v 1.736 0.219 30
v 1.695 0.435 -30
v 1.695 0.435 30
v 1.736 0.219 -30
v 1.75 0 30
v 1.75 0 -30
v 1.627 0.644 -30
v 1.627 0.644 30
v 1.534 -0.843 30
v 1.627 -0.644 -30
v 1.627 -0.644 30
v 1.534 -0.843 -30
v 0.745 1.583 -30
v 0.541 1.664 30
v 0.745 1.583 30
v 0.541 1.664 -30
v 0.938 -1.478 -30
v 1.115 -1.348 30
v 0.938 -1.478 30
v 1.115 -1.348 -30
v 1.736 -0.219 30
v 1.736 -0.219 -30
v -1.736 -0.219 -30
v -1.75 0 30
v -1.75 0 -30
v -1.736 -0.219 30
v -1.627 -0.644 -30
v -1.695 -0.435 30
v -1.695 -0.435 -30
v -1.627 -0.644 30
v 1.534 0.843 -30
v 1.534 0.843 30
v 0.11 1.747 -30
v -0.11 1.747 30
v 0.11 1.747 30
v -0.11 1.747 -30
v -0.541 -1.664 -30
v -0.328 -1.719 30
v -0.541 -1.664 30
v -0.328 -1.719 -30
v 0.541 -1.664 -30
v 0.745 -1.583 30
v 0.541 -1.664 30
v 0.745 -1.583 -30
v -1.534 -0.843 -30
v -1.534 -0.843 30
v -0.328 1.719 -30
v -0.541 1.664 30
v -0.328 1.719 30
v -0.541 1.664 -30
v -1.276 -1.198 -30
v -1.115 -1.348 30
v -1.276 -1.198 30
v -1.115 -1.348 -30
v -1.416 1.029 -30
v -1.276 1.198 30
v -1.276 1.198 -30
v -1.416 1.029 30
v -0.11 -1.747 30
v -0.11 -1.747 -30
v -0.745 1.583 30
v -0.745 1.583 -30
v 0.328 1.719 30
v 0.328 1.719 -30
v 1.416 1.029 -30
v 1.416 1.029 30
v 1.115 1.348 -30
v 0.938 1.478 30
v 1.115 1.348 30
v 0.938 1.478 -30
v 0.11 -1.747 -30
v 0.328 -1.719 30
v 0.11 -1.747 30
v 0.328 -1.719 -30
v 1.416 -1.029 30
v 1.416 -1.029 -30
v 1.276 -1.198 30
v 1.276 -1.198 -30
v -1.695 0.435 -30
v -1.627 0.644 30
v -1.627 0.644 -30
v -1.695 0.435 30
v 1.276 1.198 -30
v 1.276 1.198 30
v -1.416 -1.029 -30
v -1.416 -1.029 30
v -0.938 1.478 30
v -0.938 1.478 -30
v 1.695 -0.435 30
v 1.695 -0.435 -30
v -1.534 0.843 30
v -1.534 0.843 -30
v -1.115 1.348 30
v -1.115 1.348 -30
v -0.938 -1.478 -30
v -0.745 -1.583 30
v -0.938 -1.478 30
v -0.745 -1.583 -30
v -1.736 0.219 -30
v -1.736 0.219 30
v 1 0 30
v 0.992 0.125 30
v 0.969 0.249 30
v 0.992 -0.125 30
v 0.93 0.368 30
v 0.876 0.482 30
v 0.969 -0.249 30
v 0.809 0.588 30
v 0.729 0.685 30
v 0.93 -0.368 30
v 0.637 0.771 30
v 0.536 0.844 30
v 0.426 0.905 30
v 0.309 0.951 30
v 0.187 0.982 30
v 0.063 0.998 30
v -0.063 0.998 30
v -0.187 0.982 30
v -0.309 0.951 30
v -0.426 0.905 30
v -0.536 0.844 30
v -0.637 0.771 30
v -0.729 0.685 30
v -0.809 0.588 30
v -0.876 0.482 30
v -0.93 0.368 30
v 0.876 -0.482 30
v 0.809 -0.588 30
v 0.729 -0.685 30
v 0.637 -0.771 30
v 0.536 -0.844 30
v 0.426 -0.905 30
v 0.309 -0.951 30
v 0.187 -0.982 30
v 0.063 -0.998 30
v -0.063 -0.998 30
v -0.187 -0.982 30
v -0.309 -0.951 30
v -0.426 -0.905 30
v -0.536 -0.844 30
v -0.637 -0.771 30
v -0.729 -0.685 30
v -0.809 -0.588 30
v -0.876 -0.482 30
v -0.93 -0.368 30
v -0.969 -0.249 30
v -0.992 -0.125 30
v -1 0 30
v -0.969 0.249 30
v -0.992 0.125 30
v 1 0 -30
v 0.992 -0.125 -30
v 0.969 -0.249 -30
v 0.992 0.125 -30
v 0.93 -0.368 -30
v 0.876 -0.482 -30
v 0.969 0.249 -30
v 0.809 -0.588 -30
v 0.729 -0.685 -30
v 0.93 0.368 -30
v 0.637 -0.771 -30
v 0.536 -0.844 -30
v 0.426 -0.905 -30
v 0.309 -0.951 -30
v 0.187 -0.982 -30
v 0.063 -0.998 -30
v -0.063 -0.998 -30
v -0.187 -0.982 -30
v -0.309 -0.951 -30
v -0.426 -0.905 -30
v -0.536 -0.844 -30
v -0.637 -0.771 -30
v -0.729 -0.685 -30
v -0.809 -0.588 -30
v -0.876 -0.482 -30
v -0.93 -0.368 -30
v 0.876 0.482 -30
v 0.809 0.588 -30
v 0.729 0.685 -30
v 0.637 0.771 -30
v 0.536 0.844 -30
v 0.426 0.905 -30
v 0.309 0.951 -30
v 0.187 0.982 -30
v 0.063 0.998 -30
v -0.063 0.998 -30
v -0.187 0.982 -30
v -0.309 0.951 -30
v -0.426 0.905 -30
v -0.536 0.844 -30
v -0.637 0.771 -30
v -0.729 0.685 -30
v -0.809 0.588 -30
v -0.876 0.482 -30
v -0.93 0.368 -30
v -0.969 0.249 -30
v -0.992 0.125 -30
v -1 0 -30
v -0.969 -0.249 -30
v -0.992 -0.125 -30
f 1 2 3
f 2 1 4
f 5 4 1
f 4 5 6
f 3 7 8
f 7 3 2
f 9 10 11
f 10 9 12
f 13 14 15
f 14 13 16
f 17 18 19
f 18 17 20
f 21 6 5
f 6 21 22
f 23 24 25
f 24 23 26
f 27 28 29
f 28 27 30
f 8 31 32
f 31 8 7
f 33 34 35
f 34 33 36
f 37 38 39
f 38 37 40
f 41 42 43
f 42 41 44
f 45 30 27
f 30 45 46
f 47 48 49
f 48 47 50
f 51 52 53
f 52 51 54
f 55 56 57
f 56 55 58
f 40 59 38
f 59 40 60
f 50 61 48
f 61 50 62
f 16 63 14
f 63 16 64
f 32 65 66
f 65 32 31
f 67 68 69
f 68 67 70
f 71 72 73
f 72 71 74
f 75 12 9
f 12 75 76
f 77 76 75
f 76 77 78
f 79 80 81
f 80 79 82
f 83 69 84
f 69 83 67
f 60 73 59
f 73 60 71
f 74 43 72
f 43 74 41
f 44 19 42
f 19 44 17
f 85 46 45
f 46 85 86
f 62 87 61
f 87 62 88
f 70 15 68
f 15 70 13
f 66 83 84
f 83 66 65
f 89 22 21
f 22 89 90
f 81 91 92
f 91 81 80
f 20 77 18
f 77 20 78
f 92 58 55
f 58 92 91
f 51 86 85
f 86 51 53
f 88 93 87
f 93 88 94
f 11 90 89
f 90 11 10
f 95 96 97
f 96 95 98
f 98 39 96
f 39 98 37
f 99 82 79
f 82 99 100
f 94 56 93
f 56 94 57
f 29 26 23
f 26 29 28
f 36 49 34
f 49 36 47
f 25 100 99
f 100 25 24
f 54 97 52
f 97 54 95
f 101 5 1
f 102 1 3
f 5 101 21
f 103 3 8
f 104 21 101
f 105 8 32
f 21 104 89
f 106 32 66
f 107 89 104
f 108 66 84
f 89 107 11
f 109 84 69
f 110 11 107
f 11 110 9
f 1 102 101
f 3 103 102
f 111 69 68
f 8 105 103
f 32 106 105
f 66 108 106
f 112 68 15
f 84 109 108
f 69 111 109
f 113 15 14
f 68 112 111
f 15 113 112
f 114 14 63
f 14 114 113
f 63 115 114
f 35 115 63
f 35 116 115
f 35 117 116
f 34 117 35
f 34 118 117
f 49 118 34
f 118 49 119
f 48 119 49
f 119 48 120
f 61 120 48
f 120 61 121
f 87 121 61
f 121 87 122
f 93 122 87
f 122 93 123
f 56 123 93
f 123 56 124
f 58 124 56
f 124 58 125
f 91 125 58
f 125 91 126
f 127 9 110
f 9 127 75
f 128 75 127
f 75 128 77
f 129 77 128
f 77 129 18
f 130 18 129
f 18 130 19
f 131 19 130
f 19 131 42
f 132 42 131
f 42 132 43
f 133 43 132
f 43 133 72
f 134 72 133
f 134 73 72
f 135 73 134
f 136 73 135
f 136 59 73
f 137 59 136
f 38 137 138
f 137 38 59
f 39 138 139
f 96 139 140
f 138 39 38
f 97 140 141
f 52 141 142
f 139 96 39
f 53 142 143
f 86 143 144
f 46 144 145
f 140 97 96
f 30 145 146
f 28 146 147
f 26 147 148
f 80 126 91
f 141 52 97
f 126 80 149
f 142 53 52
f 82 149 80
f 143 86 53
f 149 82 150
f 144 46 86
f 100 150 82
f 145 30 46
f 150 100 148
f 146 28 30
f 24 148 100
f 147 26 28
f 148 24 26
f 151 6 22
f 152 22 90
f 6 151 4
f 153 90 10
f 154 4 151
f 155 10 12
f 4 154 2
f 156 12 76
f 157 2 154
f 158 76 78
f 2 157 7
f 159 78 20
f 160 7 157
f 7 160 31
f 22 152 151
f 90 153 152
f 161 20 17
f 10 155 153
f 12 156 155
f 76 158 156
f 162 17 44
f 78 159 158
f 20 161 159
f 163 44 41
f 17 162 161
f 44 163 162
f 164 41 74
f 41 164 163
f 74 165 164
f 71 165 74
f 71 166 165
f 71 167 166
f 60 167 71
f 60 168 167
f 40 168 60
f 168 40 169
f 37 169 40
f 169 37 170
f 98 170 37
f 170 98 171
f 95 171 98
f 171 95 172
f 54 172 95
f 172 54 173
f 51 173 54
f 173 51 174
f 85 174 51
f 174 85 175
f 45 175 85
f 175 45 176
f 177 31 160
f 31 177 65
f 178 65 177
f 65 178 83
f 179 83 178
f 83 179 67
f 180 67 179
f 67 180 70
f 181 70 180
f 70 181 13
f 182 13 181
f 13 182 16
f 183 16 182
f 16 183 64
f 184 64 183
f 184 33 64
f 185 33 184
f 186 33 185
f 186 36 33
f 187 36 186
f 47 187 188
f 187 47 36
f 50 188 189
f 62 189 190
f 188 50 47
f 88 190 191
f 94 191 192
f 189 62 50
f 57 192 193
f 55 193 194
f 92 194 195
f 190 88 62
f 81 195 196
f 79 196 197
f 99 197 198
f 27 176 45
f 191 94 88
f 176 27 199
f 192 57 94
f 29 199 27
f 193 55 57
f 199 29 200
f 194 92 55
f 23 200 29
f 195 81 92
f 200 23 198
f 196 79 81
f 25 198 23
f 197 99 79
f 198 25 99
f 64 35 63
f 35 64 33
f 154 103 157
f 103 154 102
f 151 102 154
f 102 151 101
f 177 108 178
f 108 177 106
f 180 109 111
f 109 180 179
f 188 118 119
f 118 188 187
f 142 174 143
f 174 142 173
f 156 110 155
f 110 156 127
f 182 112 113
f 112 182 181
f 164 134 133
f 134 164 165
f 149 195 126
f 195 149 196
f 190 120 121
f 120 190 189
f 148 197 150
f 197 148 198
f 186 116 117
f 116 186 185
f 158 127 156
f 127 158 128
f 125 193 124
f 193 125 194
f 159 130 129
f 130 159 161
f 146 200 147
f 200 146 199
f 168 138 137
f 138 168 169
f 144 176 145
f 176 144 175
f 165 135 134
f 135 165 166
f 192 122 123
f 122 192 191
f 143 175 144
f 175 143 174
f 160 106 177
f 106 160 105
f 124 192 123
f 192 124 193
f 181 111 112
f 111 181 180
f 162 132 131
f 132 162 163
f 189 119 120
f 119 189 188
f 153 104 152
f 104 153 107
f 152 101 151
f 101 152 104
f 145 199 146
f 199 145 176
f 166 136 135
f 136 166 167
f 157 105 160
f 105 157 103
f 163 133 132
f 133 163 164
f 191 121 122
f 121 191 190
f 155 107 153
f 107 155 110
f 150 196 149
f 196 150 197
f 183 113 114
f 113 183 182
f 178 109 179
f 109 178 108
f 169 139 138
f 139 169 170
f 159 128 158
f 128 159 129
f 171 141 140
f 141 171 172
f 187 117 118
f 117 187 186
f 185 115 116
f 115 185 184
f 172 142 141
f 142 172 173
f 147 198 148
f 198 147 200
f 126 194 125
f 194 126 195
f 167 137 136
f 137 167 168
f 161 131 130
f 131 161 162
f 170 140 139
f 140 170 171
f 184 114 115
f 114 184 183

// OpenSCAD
$fn = 50;


difference() {
	union() {
		translate(v = [0, 0, -30.0000000000]) {
			cylinder(h = 60, r = 1.7500000000);
		}
	}
	union() {
		translate(v = [0, 0, -100.0000000000]) {
			cylinder(h = 200, r = 1.0000000000);
		}
	}
}
